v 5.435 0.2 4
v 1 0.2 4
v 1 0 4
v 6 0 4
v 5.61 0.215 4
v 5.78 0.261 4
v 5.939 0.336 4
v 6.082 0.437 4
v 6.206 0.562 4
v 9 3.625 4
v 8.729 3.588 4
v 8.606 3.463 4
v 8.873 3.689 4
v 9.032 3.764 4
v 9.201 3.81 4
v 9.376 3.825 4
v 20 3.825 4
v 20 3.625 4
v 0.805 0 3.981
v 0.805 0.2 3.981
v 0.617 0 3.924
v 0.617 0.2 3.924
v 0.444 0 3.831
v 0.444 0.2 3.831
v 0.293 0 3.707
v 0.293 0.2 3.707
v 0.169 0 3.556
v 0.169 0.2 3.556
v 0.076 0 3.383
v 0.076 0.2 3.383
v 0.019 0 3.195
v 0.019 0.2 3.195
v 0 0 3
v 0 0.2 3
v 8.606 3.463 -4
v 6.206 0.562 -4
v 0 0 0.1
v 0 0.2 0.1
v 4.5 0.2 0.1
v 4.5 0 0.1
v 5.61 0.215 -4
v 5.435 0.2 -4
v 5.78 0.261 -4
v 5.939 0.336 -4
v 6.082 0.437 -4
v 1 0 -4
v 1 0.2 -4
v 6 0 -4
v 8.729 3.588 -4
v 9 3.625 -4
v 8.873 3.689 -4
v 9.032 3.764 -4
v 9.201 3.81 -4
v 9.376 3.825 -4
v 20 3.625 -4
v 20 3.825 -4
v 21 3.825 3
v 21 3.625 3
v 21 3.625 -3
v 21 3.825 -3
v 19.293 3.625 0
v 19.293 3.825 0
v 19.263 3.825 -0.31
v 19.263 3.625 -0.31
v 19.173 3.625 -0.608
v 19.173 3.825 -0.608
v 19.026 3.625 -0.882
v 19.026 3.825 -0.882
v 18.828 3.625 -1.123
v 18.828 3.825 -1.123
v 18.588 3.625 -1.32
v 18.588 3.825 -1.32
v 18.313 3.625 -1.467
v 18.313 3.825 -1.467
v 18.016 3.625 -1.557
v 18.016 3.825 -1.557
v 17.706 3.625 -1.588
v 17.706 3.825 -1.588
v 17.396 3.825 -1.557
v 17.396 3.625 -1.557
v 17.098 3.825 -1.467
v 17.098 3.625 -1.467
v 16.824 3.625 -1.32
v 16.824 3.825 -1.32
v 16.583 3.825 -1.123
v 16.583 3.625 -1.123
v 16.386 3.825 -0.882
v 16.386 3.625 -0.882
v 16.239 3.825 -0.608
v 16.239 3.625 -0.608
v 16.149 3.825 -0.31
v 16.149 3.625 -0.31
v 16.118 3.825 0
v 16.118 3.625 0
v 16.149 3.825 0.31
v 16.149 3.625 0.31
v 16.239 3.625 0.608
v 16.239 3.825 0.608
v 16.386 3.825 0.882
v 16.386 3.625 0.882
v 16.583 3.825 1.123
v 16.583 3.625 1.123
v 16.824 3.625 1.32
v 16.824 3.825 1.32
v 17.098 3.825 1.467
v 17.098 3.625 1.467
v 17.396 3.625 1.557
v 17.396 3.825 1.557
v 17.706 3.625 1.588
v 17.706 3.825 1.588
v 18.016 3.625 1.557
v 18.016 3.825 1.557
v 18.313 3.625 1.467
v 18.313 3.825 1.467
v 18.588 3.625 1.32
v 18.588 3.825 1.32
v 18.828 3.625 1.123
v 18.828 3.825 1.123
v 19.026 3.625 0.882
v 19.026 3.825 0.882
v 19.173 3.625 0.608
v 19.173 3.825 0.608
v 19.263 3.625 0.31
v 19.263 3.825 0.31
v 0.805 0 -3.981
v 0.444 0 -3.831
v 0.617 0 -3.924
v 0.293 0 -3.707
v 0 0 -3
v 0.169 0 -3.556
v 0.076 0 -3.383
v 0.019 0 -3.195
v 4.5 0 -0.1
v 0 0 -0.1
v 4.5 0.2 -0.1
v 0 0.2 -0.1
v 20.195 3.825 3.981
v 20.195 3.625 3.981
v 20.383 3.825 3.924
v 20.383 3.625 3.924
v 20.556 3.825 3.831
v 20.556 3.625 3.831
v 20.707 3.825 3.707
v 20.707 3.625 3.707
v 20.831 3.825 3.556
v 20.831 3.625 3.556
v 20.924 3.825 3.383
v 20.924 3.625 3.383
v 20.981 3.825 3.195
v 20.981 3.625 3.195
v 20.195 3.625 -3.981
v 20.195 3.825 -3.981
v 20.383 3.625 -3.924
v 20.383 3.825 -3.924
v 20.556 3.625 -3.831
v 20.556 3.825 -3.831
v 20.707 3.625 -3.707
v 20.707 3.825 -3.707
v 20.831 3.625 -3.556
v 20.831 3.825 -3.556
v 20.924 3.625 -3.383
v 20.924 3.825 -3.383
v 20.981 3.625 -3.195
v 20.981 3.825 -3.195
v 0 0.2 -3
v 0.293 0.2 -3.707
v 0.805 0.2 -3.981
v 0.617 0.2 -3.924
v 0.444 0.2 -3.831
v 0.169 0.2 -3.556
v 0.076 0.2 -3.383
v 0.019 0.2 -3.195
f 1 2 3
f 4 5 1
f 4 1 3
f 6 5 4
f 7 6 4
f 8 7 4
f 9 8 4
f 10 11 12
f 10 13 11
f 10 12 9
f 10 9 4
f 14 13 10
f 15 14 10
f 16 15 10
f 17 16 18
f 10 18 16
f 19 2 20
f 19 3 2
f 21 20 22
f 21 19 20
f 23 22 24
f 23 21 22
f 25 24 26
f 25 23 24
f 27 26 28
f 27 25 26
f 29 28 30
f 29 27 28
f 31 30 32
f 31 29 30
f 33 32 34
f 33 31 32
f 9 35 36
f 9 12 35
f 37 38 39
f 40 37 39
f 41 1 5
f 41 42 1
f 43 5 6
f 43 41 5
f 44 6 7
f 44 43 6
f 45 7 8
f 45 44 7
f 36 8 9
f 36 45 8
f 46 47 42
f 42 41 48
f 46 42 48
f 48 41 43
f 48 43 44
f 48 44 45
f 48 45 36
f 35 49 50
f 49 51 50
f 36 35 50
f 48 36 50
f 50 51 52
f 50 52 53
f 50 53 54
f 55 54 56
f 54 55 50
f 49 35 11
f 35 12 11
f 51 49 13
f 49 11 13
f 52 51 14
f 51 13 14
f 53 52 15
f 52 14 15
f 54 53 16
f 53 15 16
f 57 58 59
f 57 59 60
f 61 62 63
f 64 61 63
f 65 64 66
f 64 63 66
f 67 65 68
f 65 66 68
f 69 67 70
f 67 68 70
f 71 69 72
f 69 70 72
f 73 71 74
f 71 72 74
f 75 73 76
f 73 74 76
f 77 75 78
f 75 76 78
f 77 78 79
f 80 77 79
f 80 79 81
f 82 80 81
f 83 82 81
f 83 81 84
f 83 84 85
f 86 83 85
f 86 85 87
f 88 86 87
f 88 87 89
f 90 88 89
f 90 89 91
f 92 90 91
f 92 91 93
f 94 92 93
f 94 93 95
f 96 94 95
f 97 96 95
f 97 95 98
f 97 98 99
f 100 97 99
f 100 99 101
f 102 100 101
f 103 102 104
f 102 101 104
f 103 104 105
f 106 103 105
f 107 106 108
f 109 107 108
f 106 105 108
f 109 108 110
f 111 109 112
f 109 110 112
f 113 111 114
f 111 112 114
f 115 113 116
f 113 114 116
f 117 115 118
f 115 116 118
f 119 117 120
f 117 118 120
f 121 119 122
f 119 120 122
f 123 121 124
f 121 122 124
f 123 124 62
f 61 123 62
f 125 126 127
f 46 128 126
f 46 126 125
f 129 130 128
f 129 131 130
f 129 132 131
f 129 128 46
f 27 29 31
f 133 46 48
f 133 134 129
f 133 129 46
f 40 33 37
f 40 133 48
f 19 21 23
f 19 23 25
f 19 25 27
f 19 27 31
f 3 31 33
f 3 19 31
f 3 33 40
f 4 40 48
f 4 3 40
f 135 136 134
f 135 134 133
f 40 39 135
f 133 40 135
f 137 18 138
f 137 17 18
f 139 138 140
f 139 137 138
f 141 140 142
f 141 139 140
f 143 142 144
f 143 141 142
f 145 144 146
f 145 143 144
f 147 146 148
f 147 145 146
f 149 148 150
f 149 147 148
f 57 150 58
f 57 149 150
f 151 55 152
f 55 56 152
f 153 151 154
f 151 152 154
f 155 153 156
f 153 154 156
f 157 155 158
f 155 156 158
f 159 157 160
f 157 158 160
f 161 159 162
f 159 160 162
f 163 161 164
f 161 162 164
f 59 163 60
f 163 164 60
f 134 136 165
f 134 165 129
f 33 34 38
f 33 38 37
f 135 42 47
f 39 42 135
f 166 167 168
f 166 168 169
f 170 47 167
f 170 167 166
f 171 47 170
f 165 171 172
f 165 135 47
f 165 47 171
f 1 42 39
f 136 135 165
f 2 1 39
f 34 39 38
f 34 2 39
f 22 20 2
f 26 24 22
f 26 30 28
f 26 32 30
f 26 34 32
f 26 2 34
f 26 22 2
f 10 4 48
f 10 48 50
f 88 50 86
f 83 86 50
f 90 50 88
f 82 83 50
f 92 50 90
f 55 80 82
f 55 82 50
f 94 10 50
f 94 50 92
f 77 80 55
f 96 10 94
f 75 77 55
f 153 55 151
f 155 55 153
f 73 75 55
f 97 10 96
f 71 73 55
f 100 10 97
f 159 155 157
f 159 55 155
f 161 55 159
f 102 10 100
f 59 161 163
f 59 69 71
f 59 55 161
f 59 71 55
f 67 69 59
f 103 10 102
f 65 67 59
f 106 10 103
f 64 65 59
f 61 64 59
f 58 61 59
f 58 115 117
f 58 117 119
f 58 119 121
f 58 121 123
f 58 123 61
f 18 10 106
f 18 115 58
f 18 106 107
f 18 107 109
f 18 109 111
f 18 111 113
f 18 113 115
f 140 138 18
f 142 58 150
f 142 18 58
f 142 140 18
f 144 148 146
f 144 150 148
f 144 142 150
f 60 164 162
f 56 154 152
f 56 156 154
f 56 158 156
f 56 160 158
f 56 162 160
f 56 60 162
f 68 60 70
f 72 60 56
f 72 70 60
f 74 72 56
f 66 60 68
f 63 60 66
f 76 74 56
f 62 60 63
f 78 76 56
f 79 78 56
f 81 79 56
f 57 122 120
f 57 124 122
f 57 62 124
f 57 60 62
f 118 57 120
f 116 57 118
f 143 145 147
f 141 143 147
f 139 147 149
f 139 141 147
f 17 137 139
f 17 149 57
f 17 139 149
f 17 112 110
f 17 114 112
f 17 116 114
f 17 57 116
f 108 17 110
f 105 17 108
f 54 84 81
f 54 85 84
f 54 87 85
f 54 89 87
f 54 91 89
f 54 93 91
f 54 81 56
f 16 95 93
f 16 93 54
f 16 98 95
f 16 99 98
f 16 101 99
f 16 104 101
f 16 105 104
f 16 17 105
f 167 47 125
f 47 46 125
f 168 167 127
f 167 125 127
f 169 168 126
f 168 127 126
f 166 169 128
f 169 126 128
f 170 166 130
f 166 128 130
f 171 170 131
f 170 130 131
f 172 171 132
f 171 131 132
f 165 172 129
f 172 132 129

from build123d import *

# Parameters (mm, degrees)
BOSS_EXTRUDE1_DEPTH = 4
SKETCH2_R           = 1.5875
CUT_EXTRUDE1_DEPTH  = 10
FILLET1_R           = 1
SKETCH3_W           = 4.5
SKETCH3_H           = 0.2
CUT_EXTRUDE2_DEPTH  = 10
FILLET2_R           = 1


with BuildPart() as part:
    # Sketch1 → Boss-Extrude1 (new body, symmetric)
    with BuildSketch(Plane.XY):
        Polygon((0, 0), (6, 0), (9, 3.625), (21, 3.625), (21, 3.825), (8.905909928, 3.825), (5.905909928, 0.2), (0, 0.2), align=None)
    extrude(amount=BOSS_EXTRUDE1_DEPTH, both=True)

    # Sketch2 → Cut-Extrude1 (cut)
    with BuildSketch(Plane(origin=(0, 3.825, 0), x_dir=(1, 0, 0), z_dir=(0, 1, 0))):
        with Locations((17.705909928, 0)):
            Circle(SKETCH2_R)
    extrude(amount=-CUT_EXTRUDE1_DEPTH, mode=Mode.SUBTRACT)

    # Fillet1
    fillet1_edges = [part.edges().sort_by_distance(p)[0] for p in [
        (0, 0.1, -4),
        (21, 3.725, 4),
        (0, 0.1, 4),
        (21, 3.725, -4),
    ]]
    fillet(fillet1_edges, radius=FILLET1_R)

    # Sketch3 → Cut-Extrude2 (cut)
    with BuildSketch(Plane(origin=(0, 0.2, 0), x_dir=(1, 0, 0), z_dir=(0, 1, 0))):
        with Locations((2.25, 0)):
            Rectangle(SKETCH3_W, SKETCH3_H)
    extrude(amount=-CUT_EXTRUDE2_DEPTH, mode=Mode.SUBTRACT)

    # Fillet2
    fillet2_edges = [part.edges().sort_by_distance(p)[0] for p in [
        (5.905909928, 0.2, 0),
        (8.905909928, 3.825, 0),
    ]]
    fillet(fillet2_edges, radius=FILLET2_R)


solid = part.part
